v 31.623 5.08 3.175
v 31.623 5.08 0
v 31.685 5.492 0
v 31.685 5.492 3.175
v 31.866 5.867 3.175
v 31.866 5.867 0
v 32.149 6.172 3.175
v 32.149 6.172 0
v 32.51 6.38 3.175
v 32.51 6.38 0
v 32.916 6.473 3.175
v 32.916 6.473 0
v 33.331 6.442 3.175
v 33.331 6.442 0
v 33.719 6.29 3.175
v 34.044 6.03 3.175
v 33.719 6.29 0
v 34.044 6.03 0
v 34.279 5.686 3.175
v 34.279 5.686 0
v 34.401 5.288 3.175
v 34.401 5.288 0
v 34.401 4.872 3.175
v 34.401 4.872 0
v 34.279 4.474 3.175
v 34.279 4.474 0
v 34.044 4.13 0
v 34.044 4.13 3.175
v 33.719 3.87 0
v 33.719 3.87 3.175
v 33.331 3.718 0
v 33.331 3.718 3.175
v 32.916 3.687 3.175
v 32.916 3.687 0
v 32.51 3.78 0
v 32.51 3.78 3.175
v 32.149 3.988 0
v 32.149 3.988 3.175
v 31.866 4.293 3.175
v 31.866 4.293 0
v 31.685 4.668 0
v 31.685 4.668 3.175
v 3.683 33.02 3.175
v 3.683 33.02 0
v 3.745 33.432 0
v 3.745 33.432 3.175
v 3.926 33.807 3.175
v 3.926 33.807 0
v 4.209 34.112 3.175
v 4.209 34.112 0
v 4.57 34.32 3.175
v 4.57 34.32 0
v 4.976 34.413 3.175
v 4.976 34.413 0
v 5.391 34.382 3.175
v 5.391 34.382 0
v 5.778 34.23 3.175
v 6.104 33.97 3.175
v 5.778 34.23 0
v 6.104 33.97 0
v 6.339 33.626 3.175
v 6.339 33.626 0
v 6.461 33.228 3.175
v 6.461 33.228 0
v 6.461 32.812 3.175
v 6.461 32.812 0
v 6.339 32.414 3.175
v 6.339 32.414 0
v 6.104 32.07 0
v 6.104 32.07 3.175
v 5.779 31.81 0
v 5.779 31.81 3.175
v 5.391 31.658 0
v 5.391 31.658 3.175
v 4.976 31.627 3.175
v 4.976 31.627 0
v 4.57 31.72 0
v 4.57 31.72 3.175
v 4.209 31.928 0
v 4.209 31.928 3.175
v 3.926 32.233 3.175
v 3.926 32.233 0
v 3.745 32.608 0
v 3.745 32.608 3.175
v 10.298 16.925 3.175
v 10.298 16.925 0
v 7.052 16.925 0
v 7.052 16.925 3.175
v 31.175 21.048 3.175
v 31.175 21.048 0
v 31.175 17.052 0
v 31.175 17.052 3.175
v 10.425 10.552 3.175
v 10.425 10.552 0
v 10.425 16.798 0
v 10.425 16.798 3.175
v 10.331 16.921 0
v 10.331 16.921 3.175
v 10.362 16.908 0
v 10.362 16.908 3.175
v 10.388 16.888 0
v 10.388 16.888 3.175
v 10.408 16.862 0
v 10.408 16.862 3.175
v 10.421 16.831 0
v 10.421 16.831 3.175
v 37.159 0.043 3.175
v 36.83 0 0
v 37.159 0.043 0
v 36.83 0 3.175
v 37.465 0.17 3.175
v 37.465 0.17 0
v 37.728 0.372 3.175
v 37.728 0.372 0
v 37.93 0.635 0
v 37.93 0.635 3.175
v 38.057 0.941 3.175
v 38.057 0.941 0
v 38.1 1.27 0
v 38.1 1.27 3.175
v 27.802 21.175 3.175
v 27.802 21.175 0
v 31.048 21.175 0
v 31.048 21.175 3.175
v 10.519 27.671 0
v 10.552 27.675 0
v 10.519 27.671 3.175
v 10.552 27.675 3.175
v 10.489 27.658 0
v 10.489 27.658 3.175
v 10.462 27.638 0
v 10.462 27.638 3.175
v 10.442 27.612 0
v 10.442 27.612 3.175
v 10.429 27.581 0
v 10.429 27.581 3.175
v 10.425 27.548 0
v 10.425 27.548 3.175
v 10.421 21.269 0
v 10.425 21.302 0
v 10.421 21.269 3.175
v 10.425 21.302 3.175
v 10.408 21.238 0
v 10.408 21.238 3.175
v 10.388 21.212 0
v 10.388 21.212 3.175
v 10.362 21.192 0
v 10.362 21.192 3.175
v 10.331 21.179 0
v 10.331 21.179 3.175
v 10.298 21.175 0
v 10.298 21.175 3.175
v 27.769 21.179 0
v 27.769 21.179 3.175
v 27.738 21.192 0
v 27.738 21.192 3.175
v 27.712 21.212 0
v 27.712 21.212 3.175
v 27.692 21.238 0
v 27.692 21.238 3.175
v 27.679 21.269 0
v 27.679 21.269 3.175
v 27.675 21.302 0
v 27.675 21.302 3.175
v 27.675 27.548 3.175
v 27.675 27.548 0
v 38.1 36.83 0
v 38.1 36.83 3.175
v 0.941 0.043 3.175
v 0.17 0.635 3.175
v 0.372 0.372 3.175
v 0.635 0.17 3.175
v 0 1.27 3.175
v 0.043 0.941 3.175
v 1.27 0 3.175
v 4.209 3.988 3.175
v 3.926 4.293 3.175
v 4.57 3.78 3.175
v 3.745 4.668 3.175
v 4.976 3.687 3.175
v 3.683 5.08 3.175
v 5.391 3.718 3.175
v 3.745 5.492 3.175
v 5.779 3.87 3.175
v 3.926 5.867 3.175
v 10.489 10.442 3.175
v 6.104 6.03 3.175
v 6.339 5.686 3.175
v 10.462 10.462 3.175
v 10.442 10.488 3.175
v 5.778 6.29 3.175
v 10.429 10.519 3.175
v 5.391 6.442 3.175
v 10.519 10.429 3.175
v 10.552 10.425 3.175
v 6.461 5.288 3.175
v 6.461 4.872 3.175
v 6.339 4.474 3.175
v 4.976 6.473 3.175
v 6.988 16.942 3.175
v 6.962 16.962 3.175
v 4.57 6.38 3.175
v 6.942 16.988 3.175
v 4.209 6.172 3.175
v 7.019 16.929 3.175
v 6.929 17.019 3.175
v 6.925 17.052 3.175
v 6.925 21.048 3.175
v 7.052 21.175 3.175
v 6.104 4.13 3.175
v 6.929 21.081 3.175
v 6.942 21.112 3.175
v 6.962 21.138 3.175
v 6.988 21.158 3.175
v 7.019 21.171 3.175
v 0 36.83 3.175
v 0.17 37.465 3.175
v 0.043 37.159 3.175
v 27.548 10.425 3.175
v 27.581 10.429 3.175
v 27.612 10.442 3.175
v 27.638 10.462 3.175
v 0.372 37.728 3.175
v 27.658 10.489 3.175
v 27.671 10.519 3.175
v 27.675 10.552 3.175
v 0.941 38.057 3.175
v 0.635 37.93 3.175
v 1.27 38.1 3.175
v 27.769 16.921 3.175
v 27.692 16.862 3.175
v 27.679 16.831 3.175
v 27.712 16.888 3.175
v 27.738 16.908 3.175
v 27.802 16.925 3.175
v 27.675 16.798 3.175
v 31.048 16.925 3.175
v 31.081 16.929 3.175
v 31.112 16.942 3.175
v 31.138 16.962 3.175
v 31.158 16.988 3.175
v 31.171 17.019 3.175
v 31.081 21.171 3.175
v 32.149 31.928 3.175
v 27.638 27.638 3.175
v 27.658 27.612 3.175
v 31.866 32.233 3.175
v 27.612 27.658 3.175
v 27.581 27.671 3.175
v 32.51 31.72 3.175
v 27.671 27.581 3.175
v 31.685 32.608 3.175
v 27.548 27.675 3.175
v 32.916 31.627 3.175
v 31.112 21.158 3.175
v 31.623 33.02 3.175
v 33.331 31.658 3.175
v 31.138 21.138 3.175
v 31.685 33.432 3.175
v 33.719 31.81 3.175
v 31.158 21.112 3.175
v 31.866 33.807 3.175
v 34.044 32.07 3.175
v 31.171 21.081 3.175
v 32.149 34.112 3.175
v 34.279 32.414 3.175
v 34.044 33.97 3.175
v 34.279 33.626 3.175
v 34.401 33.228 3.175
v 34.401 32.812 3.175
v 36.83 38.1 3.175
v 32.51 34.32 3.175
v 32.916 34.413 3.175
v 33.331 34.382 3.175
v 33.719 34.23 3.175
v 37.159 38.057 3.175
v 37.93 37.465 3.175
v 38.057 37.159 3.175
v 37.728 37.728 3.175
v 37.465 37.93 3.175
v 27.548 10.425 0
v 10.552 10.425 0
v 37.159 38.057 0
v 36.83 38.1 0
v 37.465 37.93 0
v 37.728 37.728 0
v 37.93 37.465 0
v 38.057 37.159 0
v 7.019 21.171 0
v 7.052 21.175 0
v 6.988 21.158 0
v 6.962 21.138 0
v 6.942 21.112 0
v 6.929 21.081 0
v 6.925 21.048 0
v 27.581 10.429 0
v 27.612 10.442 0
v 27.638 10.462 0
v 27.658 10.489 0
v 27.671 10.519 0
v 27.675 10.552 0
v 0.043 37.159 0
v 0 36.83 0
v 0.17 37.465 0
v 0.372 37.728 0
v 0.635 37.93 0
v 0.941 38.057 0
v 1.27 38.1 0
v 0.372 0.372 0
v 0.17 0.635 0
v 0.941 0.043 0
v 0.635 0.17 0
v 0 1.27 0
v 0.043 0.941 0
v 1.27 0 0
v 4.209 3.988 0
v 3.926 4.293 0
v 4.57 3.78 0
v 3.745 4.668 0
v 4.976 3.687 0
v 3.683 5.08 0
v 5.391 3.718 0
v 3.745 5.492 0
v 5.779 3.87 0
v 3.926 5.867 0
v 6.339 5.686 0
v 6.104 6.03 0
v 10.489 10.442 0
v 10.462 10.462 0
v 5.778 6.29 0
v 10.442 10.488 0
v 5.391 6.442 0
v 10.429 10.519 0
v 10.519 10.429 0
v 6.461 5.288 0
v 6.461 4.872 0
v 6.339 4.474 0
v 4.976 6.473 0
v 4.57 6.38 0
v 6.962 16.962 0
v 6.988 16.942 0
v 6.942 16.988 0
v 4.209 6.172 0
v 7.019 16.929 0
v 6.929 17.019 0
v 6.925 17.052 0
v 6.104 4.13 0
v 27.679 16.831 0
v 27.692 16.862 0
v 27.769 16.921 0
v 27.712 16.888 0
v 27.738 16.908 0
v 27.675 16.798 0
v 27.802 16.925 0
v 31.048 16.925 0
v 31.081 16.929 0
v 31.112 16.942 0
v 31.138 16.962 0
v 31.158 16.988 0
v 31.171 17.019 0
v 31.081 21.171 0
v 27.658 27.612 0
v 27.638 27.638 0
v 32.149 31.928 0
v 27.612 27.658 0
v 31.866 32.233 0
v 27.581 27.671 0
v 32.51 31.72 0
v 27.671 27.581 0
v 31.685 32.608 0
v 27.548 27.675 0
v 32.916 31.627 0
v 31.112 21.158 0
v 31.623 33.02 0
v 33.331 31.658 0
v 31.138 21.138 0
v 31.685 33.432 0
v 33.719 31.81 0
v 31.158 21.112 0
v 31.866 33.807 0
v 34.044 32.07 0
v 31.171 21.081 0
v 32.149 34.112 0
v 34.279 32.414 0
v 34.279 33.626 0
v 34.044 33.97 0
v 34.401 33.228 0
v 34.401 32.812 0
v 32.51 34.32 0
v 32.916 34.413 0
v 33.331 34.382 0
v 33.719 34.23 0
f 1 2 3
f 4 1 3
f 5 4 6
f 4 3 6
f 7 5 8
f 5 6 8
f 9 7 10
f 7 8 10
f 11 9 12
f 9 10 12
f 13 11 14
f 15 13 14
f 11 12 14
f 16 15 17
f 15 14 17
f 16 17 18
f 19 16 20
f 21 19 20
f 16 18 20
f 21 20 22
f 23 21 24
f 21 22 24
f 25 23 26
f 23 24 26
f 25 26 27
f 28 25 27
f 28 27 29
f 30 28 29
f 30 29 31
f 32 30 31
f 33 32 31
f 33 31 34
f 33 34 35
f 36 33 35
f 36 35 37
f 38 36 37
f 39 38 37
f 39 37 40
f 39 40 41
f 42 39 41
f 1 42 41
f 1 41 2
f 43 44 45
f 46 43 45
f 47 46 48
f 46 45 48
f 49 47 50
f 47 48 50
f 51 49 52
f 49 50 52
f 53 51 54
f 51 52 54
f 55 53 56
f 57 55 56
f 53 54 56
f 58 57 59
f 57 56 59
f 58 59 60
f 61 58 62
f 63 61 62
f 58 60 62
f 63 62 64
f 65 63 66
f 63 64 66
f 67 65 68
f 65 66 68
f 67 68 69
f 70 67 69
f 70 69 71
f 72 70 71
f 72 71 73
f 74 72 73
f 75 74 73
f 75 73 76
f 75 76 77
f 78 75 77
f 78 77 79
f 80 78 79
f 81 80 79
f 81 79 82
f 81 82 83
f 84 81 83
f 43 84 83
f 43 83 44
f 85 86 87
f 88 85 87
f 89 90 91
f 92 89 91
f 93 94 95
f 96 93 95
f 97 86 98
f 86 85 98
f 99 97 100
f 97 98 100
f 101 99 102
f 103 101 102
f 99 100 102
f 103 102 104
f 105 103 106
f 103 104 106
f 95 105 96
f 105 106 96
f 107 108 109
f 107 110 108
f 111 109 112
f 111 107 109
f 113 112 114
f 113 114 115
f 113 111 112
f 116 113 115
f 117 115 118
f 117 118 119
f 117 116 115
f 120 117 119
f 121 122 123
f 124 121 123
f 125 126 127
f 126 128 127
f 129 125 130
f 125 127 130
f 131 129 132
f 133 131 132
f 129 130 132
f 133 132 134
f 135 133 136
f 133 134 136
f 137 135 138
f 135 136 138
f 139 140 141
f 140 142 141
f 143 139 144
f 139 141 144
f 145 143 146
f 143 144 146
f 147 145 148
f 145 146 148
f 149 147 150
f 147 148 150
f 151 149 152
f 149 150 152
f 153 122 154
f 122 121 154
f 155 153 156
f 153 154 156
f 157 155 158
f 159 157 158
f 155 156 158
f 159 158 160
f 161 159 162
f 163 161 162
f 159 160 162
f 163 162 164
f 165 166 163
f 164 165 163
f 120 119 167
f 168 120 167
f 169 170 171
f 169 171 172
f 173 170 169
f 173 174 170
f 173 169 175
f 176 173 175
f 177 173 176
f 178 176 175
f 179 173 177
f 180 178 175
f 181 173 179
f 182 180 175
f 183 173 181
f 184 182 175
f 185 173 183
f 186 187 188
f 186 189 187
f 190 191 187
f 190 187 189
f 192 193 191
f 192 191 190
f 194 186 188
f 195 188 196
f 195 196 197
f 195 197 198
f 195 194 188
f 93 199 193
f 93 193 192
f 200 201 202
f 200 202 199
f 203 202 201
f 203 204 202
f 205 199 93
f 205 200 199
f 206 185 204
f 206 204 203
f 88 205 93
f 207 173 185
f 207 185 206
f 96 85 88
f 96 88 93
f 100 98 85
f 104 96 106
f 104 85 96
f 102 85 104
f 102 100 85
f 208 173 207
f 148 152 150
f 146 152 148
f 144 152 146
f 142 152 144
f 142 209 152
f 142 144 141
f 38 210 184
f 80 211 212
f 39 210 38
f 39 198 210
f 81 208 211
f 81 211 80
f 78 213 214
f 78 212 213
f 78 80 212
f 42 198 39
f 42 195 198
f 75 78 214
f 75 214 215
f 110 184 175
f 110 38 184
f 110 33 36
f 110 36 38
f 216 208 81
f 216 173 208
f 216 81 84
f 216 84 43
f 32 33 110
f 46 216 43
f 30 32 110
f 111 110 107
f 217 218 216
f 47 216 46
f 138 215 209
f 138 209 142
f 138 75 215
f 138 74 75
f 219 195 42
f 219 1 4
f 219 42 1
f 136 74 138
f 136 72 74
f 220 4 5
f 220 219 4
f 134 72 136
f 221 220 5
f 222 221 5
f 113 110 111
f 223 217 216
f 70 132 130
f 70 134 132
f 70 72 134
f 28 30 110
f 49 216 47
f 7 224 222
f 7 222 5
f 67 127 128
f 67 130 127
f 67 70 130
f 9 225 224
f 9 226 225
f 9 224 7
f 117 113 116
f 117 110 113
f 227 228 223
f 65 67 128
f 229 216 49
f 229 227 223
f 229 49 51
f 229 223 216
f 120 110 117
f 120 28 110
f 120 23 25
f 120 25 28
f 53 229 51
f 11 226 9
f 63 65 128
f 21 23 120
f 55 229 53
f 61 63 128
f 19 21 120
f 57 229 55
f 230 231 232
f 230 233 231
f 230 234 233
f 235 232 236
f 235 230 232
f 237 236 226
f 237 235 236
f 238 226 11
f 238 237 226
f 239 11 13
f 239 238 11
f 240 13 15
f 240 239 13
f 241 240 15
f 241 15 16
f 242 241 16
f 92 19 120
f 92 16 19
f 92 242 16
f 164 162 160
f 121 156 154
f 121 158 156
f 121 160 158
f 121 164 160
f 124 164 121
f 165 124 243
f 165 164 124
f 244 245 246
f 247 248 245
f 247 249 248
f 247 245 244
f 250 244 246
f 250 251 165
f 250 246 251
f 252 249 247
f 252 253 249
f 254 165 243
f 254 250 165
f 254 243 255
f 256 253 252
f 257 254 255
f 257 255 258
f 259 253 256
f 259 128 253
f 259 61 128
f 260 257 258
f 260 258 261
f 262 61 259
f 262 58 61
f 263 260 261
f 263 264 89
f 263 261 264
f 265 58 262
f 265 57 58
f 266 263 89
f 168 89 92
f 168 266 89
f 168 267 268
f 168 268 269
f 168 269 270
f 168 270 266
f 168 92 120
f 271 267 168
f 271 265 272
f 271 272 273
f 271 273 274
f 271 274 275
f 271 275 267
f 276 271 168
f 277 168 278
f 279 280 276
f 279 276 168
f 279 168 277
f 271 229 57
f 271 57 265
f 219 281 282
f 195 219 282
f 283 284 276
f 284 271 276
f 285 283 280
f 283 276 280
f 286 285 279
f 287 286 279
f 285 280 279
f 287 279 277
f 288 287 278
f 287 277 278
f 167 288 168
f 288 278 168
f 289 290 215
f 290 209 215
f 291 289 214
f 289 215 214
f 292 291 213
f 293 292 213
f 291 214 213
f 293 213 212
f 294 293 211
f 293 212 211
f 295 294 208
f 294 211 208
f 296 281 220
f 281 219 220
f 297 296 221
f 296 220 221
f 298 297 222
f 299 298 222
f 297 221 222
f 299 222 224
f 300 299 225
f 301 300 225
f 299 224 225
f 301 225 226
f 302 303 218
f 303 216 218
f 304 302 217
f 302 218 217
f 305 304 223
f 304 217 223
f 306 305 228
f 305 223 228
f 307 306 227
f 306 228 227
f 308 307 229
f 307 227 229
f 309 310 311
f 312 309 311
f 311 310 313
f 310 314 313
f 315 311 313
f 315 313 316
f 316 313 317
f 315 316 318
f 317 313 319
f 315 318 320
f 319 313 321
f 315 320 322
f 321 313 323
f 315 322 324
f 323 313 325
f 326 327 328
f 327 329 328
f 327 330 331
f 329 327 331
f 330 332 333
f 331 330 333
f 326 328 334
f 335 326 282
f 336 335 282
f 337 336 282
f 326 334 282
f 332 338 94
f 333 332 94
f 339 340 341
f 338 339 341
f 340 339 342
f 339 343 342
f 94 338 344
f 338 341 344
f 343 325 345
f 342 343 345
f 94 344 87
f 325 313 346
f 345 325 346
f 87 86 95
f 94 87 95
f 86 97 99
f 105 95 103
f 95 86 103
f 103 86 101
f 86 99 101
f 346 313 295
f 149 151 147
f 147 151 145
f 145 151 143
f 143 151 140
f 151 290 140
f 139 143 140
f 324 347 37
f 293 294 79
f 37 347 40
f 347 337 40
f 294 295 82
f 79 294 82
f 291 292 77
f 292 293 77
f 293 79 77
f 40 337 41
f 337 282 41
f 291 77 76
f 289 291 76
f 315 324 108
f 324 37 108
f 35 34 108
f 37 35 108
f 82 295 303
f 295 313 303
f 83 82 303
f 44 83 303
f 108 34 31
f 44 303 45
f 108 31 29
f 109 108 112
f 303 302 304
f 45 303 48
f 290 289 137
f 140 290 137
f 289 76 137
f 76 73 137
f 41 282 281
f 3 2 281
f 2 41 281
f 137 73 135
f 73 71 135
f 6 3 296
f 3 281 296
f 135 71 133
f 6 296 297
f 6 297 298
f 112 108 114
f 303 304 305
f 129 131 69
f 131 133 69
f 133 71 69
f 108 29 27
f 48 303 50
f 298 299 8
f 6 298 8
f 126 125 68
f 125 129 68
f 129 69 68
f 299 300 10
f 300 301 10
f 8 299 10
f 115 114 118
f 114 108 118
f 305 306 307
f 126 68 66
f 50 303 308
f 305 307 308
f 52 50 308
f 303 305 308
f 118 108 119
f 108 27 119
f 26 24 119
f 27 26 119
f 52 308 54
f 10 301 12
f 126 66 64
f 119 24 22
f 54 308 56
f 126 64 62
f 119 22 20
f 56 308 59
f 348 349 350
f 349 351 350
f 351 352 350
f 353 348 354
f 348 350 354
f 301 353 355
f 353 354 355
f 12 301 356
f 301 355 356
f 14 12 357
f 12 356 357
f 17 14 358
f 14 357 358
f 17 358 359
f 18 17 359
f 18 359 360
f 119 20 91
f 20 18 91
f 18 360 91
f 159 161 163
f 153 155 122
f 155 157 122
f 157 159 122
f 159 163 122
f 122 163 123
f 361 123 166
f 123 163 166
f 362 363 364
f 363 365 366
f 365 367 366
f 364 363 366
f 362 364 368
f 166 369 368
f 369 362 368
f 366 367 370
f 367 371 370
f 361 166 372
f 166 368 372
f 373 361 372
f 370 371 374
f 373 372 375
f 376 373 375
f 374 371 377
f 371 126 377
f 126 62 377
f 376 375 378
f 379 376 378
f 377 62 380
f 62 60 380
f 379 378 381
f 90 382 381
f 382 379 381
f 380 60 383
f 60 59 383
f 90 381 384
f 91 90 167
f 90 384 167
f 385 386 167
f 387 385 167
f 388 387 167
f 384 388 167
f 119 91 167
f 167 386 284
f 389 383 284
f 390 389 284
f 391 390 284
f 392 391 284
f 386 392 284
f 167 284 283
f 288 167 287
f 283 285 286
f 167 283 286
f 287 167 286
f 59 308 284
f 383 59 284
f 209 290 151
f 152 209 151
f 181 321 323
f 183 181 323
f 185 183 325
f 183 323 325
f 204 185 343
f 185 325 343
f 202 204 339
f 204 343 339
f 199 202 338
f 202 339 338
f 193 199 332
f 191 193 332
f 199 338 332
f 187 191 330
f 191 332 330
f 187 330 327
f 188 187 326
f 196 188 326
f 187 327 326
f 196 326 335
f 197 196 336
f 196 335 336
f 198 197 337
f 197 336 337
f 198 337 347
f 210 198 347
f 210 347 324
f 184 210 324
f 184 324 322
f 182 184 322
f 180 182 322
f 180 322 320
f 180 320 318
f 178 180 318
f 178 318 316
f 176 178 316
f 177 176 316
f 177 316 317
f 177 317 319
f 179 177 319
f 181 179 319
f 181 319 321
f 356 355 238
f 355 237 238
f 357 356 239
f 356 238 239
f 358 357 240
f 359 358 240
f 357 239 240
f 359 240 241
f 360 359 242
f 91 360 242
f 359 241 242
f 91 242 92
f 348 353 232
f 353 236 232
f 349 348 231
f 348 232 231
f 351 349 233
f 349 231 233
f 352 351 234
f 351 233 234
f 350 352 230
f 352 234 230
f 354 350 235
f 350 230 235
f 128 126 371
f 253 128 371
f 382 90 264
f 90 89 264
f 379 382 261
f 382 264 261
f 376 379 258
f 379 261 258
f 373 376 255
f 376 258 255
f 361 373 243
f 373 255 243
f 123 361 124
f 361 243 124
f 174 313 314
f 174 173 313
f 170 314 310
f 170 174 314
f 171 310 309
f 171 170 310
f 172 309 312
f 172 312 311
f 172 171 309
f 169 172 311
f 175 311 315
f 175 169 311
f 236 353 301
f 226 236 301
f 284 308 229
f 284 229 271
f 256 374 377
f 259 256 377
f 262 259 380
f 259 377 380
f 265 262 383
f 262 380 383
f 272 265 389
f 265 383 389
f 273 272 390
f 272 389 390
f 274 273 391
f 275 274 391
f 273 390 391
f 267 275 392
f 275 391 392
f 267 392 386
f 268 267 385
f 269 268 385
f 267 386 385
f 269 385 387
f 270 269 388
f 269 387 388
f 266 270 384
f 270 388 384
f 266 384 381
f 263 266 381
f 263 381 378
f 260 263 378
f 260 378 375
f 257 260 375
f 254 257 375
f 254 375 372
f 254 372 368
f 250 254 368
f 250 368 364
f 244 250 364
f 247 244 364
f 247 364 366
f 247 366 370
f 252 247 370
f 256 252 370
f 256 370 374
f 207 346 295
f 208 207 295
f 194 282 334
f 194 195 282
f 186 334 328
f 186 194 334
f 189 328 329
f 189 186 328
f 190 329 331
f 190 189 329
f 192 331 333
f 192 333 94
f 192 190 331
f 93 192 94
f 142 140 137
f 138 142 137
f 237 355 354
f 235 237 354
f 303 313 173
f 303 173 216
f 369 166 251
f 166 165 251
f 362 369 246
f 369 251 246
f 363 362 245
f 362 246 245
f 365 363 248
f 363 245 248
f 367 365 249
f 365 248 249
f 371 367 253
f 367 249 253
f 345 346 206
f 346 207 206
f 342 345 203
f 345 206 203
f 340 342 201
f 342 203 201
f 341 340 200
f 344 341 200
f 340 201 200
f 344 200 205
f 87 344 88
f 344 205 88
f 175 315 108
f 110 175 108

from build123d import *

# Parameters (mm, degrees)
SKETCH1_W             = 38.1
SKETCH1_H             = 38.1
BOSS_EXTRUDE1_DEPTH   = 3.175
FILLET1_R             = 1.27
FILLET2_R             = 0.127
F_3_CLEARANCE_HOLE1_D = 2.794


with BuildPart() as part:
    # Sketch1 → Boss-Extrude1 (new body)
    with BuildSketch(Plane.XY):
        with Locations((19.05, 19.05)):
            Rectangle(SKETCH1_W, SKETCH1_H)
        Polygon((10.425, 10.425), (10.425, 16.925), (6.925, 16.925), (6.925, 21.175), (10.425, 21.175), (10.425, 27.675), (27.675, 27.675), (27.675, 21.175), (31.175, 21.175), (31.175, 16.925), (27.675, 16.925), (27.675, 10.425), align=None, mode=Mode.SUBTRACT)
    extrude(amount=BOSS_EXTRUDE1_DEPTH)

    # Fillet1
    fillet1_edges = [part.edges().sort_by_distance(p)[0] for p in [
        (0, 38.1, 1.5875),
        (38.1, 38.1, 1.5875),
        (38.1, 0, 1.5875),
        (0, 0, 1.5875),
    ]]
    fillet(fillet1_edges, radius=FILLET1_R)

    # Fillet2
    fillet2_edges = [part.edges().sort_by_distance(p)[0] for p in [
        (10.425, 10.425, 1.5875),
        (27.675, 10.425, 1.5875),
        (27.675, 16.925, 1.5875),
        (31.175, 16.925, 1.5875),
        (31.175, 21.175, 1.5875),
        (27.675, 21.175, 1.5875),
        (27.675, 27.675, 1.5875),
        (10.425, 27.675, 1.5875),
        (10.425, 21.175, 1.5875),
        (6.925, 21.175, 1.5875),
        (6.925, 16.925, 1.5875),
        (10.425, 16.925, 1.5875),
    ]]
    fillet(fillet2_edges, radius=FILLET2_R)

    # #3 Clearance Hole1 (through all)
    with Locations(Plane.XY.offset(3.175)):
        with Locations((5.08, 33.02), (33.02, 33.02), (33.02, 5.08), (5.08, 5.08)):
            Hole(F_3_CLEARANCE_HOLE1_D / 2)


solid = part.part
